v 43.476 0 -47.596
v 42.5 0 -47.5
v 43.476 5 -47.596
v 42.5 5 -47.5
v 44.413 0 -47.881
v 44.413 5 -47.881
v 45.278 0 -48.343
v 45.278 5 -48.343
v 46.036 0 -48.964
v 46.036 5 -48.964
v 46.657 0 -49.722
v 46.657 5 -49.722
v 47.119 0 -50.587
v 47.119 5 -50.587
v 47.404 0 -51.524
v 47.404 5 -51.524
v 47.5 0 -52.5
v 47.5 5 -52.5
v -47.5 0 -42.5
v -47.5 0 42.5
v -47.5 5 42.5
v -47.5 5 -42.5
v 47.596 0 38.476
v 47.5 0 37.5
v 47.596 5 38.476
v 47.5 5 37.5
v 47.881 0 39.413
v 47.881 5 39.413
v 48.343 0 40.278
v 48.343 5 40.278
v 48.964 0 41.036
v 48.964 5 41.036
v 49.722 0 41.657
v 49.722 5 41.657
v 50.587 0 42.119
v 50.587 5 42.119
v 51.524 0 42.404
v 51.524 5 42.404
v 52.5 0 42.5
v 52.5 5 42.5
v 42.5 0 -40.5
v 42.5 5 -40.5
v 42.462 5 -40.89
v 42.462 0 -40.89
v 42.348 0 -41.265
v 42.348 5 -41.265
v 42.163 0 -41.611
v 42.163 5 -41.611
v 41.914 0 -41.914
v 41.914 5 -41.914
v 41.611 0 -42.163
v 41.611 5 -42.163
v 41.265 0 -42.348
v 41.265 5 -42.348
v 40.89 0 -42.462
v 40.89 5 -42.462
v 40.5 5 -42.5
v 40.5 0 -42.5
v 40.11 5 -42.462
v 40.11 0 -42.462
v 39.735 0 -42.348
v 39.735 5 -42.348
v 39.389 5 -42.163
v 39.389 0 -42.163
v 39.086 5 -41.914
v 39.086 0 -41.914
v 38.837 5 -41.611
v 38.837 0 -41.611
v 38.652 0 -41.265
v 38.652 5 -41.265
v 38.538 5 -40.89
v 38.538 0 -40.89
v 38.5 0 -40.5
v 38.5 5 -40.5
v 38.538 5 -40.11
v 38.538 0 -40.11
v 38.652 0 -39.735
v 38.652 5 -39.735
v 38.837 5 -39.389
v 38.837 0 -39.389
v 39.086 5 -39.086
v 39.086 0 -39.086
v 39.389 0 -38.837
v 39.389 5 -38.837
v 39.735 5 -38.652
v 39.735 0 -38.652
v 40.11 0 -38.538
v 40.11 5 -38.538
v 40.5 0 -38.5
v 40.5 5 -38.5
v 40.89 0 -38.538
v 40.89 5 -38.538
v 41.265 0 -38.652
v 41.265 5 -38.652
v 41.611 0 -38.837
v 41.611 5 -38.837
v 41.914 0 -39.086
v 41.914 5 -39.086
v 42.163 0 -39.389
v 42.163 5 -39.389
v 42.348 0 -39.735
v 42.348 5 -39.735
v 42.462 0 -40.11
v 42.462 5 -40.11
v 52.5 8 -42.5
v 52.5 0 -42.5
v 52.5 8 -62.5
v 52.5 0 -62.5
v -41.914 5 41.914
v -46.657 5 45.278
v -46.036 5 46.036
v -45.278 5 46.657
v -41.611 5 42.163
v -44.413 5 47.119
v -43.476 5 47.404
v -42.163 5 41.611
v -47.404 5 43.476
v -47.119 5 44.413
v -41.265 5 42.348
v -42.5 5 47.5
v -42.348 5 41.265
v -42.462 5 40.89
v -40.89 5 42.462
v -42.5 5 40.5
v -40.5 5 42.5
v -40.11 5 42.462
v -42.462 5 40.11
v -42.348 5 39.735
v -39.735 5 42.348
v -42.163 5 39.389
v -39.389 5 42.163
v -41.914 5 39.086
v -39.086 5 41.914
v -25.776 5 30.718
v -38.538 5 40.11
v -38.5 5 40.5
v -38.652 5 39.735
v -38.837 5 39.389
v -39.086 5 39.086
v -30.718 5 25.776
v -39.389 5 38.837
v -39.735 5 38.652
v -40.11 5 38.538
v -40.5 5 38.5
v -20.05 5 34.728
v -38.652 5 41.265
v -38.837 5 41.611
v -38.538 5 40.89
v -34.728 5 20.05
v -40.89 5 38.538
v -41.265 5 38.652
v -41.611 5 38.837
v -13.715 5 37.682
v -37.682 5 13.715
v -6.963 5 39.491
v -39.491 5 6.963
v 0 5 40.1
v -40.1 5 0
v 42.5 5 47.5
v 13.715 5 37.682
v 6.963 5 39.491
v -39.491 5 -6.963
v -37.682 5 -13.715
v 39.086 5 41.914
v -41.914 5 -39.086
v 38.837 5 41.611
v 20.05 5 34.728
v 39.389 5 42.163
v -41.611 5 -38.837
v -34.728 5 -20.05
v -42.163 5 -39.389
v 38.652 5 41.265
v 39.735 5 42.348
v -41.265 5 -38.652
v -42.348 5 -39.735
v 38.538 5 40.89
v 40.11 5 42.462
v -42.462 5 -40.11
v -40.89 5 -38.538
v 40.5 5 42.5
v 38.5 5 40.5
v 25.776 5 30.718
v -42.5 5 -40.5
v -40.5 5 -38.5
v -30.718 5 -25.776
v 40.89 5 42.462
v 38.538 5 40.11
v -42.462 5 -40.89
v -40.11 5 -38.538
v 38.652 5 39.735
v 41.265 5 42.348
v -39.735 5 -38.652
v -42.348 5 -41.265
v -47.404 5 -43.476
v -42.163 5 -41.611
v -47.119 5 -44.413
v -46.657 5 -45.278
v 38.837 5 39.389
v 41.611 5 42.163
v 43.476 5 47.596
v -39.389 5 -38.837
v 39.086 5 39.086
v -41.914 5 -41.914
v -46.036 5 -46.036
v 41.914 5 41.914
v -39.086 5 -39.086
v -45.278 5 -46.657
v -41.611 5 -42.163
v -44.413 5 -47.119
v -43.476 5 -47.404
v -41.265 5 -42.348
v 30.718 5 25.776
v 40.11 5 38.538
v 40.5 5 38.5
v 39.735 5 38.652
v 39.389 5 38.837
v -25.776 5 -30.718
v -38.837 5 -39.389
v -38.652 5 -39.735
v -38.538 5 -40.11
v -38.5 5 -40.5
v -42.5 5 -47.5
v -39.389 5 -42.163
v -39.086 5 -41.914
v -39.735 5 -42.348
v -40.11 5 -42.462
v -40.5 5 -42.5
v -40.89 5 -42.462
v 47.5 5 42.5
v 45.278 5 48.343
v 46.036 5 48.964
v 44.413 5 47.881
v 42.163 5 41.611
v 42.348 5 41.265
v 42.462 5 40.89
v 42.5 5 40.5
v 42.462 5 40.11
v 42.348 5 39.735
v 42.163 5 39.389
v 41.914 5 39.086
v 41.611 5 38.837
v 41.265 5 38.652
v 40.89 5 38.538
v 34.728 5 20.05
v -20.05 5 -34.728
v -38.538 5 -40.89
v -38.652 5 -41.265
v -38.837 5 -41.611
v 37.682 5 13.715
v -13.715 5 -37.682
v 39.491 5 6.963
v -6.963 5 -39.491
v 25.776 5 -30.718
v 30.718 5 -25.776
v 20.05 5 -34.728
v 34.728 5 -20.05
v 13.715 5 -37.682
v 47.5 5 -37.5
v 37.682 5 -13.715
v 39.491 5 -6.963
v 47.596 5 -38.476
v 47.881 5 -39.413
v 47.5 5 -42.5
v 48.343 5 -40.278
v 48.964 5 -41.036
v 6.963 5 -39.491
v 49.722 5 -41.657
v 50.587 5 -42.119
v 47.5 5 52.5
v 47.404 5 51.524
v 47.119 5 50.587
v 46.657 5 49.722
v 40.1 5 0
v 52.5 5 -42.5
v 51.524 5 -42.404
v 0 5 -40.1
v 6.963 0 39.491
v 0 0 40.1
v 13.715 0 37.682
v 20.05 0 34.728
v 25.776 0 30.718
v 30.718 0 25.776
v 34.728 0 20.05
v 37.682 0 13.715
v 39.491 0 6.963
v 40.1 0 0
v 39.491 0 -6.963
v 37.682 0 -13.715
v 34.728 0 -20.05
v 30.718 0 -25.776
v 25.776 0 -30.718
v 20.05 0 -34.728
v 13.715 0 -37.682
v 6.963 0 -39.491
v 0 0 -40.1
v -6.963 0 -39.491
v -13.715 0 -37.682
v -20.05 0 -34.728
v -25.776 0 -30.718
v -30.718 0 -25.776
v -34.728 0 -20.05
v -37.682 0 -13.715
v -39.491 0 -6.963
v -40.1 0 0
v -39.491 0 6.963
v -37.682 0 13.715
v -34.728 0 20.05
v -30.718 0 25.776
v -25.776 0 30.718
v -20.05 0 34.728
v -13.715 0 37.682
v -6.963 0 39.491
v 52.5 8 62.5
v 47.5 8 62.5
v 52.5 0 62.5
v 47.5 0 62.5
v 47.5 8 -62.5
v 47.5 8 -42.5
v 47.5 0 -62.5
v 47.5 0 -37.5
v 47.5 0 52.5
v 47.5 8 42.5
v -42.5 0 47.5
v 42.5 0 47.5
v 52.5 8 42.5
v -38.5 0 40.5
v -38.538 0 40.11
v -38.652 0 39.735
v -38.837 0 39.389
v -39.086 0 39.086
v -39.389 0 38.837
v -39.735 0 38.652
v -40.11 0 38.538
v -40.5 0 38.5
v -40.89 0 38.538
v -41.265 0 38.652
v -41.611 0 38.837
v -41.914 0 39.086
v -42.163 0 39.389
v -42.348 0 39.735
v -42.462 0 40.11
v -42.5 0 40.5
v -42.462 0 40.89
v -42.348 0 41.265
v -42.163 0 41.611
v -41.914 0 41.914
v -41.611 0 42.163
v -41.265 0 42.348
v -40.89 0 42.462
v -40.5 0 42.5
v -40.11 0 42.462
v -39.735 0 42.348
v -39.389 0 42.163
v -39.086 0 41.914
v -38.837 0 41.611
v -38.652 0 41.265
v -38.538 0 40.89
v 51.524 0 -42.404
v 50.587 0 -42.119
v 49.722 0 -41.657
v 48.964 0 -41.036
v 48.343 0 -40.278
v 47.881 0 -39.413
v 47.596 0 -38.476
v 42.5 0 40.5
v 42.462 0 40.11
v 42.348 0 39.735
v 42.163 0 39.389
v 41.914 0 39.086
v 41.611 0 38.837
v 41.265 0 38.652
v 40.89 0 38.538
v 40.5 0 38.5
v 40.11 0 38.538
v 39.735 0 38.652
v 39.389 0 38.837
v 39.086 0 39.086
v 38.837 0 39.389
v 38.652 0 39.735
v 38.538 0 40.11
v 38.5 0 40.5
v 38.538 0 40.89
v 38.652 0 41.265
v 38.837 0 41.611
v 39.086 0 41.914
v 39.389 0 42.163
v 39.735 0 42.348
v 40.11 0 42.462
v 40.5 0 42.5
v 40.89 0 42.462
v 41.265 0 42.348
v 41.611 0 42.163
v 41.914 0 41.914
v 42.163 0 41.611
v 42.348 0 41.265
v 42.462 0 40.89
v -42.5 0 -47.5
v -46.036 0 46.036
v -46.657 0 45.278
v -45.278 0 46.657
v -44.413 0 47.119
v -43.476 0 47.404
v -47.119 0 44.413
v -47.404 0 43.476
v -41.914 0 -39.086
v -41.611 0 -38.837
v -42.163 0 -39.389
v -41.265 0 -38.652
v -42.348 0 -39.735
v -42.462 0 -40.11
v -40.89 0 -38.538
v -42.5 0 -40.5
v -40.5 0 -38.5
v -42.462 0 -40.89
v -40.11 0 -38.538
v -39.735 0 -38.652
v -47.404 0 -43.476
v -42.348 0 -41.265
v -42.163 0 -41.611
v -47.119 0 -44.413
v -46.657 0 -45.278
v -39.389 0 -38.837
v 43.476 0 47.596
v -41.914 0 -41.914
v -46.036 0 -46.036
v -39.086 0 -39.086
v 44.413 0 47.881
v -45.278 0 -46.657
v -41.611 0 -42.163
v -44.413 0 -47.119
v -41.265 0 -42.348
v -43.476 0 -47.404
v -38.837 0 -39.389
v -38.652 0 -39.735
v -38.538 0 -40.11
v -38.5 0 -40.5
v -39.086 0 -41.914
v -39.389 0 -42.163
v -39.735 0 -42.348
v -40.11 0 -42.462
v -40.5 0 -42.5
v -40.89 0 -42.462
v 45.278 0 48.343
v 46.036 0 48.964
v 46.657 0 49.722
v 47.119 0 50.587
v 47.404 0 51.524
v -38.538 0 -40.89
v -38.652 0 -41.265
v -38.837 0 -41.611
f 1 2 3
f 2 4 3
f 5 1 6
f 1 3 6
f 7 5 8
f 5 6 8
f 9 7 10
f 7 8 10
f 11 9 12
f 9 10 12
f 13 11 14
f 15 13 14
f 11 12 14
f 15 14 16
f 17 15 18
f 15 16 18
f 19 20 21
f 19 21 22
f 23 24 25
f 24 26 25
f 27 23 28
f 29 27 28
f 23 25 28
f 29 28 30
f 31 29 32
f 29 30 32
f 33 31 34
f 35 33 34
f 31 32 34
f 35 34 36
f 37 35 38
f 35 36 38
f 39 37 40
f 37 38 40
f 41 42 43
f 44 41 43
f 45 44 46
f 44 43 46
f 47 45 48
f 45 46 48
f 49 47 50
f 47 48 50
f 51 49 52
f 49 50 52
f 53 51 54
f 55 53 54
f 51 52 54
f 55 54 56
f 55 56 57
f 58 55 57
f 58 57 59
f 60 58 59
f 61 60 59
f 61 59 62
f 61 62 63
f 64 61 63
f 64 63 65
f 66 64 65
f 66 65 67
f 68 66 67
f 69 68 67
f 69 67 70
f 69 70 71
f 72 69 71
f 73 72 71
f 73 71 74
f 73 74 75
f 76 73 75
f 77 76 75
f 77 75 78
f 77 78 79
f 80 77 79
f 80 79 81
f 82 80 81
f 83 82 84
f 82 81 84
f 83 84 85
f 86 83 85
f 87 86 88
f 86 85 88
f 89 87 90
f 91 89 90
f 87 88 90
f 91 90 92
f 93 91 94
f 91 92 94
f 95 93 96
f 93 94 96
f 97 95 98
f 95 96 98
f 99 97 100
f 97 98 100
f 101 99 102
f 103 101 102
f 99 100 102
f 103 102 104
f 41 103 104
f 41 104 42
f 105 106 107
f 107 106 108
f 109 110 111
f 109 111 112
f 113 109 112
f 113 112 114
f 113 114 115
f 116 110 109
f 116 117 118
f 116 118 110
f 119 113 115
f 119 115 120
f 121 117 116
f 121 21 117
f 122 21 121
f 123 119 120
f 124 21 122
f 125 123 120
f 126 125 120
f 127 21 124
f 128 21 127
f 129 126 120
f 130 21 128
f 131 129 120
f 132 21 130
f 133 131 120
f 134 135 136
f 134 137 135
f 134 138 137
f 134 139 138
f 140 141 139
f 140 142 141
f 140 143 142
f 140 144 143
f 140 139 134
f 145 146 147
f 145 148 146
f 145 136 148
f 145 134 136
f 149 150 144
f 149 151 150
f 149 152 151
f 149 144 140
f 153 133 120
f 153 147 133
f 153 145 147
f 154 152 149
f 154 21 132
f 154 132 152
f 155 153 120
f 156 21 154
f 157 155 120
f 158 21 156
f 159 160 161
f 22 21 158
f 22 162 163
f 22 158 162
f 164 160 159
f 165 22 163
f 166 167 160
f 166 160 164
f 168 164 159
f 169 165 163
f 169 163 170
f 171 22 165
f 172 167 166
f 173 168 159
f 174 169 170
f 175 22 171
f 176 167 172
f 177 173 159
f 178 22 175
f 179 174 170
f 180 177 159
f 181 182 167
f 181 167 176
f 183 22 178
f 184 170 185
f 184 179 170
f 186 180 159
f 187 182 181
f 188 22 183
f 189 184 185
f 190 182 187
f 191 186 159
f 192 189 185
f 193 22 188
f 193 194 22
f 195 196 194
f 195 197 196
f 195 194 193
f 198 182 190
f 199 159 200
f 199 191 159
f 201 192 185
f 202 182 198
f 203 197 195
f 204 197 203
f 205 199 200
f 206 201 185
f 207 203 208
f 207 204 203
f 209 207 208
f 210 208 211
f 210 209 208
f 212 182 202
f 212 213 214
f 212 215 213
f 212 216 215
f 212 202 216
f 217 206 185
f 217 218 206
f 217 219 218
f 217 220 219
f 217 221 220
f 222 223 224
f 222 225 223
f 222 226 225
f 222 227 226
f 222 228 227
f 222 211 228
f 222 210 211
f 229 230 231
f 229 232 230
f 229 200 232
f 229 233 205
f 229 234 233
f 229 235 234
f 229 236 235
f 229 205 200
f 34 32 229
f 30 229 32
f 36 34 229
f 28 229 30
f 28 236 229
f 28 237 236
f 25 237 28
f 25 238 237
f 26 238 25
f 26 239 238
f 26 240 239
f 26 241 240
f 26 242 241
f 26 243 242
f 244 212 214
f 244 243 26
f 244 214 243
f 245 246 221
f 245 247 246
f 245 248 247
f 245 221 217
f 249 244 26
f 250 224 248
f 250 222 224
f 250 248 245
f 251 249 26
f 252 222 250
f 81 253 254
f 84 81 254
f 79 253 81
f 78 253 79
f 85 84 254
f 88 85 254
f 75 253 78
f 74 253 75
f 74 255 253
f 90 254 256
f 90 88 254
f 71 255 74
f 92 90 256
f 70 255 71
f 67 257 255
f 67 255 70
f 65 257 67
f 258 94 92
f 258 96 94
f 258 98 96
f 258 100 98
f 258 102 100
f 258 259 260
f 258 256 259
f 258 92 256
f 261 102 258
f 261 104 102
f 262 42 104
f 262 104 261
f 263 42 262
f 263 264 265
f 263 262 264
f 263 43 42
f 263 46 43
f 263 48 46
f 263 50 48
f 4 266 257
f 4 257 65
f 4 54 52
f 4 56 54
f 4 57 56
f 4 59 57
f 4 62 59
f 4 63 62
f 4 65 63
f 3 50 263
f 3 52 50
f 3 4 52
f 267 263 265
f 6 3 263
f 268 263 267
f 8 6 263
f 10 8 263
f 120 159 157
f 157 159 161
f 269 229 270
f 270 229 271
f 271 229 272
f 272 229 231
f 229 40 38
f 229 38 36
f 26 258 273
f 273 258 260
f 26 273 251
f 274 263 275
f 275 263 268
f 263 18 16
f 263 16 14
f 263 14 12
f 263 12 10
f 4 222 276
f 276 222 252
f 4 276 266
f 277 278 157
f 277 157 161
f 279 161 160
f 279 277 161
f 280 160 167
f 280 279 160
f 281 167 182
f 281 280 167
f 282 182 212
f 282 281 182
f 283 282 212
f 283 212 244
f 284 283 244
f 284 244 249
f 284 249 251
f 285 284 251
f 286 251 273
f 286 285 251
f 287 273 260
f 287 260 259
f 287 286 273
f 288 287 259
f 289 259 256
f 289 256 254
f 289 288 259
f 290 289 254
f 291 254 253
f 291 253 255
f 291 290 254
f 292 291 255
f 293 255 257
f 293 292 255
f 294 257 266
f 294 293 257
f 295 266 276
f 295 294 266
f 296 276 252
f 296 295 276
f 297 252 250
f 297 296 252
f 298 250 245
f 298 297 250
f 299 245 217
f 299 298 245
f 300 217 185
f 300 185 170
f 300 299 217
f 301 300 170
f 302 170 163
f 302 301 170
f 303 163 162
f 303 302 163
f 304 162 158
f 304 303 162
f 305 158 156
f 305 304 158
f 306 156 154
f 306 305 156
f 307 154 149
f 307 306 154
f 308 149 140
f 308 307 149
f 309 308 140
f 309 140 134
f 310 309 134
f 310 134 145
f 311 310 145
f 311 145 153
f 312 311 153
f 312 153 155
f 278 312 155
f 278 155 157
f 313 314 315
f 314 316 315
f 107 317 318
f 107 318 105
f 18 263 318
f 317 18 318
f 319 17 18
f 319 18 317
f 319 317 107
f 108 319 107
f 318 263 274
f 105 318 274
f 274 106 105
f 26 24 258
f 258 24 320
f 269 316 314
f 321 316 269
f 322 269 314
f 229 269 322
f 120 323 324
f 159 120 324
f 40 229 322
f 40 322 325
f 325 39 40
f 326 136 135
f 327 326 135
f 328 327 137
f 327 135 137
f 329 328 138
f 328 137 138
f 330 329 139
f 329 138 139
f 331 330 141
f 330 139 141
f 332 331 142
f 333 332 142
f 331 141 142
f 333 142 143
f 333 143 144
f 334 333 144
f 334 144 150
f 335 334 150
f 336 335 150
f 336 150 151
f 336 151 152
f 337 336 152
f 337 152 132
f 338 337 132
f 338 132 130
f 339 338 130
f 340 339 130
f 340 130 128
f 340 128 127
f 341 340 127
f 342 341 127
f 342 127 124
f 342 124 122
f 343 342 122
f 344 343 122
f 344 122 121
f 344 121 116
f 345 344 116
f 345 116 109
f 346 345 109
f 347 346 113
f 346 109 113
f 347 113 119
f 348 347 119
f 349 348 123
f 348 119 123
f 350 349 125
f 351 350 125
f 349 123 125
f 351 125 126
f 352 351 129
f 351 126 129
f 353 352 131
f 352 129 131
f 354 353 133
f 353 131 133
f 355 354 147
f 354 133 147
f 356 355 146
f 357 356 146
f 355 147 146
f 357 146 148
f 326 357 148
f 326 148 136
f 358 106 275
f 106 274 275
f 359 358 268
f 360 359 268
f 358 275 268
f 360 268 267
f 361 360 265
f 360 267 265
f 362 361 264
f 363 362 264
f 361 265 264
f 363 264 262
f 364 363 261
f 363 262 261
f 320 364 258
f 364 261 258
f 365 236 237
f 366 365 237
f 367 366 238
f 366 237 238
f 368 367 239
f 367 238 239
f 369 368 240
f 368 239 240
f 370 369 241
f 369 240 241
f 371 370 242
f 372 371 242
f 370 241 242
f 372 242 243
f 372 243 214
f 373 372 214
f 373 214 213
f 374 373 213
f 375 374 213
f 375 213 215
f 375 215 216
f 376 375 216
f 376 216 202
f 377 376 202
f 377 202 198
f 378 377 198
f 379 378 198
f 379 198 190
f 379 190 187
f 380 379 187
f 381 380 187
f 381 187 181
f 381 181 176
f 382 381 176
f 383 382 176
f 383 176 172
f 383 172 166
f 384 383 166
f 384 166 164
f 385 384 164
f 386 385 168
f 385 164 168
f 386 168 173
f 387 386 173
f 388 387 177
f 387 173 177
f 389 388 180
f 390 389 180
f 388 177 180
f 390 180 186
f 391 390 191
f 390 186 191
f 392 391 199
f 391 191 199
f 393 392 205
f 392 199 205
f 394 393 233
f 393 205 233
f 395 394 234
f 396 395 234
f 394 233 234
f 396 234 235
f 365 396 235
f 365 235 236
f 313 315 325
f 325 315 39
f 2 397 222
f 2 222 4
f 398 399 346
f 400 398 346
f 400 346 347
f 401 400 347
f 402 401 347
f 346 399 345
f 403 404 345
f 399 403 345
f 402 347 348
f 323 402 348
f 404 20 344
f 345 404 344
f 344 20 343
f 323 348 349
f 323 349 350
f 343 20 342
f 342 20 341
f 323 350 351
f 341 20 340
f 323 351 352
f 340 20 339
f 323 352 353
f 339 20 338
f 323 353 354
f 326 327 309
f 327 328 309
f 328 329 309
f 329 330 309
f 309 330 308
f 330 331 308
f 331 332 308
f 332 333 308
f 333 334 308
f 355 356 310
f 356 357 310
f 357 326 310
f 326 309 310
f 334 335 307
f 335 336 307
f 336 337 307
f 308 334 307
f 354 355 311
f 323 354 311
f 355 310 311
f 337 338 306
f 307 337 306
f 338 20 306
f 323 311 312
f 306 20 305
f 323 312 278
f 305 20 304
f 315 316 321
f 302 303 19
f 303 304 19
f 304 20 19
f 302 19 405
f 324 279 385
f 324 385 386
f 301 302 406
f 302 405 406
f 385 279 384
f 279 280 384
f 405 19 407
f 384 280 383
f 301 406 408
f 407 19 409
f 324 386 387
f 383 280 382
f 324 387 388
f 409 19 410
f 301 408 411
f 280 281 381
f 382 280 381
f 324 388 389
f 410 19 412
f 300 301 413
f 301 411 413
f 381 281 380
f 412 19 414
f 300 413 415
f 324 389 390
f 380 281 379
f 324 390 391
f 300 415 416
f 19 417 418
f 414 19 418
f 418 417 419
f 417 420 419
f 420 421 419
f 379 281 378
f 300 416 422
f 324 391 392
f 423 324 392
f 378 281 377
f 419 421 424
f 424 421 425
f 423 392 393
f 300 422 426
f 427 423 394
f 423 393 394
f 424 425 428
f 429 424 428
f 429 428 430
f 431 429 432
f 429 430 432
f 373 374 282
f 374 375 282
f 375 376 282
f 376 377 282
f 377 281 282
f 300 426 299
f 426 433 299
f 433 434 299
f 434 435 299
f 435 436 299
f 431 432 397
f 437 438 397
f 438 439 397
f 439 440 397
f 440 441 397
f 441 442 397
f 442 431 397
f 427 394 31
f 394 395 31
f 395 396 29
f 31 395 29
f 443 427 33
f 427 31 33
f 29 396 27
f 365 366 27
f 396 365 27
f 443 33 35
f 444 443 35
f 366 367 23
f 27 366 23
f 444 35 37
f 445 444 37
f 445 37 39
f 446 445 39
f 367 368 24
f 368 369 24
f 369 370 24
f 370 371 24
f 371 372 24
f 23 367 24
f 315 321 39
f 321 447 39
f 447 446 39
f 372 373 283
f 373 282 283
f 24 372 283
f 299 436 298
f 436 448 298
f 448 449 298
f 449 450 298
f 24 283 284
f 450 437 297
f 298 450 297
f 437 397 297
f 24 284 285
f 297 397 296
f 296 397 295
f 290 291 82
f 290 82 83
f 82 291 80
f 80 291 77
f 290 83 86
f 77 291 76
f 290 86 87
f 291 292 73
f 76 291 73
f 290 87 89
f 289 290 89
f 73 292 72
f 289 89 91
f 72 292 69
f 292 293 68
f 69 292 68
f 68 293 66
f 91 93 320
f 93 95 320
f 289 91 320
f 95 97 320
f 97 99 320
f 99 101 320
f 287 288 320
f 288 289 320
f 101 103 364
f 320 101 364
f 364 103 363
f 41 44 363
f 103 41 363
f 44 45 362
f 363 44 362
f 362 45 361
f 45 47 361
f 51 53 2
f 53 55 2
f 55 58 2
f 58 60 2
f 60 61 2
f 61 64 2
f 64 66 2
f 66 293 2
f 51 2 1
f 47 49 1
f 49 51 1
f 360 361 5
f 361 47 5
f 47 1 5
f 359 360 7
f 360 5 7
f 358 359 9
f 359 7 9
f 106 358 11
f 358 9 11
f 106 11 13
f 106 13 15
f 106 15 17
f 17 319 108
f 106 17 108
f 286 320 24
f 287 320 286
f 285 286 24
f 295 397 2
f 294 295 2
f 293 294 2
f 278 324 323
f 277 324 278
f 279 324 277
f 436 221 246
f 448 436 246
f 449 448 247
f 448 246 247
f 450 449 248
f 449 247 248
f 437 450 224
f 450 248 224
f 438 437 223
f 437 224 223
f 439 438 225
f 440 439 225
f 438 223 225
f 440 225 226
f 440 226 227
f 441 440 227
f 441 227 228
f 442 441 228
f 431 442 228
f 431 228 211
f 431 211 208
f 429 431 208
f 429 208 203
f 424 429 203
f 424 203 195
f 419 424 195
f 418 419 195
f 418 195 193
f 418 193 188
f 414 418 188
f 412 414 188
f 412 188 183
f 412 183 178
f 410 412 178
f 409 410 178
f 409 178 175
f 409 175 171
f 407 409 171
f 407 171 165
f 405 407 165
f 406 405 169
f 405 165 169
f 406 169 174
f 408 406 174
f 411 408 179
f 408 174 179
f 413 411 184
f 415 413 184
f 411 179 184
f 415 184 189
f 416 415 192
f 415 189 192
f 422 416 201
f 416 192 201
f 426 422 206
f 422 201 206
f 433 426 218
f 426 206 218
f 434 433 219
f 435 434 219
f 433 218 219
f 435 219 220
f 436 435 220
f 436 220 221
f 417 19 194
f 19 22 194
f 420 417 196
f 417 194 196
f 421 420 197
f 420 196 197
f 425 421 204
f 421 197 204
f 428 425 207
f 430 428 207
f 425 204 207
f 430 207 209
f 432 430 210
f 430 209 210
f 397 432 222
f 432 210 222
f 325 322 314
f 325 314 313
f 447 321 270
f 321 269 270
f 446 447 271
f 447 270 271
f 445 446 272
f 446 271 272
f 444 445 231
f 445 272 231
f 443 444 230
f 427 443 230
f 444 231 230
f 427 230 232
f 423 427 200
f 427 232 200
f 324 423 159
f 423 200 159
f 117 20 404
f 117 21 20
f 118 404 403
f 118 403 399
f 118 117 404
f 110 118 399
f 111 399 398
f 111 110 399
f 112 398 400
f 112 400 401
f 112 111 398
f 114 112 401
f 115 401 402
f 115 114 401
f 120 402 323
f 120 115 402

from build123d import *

# Parameters (mm, degrees)
SKETCH1_W             = 95
SKETCH1_H             = 95
SKETCH1_W_2           = 81
SKETCH1_H_2           = 81
SKETCH1_R             = 40.1
BOSS_EXTRUDE1_DEPTH   = 5
F_4_0MM_DOWEL_HOLE1_D = 4
SKETCH5_W             = 5
SKETCH5_H             = 20
BOSS_EXTRUDE2_DEPTH   = 5
SKETCH6_W             = 5
SKETCH6_H             = 20
BOSS_EXTRUDE3_DEPTH   = 3
FILLET1_R             = 5


with BuildPart() as part:
    # Sketch1 → Boss-Extrude1 (new body)
    # profile 1 of 2: a face of its own
    with BuildSketch(Plane(origin=(0, 0, 0), x_dir=(1, 0, 0), z_dir=(0, 1, 0))):
        Rectangle(SKETCH1_W, SKETCH1_H)
        Rectangle(SKETCH1_W_2, SKETCH1_H_2, mode=Mode.SUBTRACT)
    # profile 2 of 2: a face of its own
    with BuildSketch(Plane(origin=(0, 0, 0), x_dir=(1, 0, 0), z_dir=(0, 1, 0))):
        Rectangle(SKETCH1_W_2, SKETCH1_H_2)
        with Locations(Location((0, 0, 0), (0, 0, 270))):
            Circle(SKETCH1_R, mode=Mode.SUBTRACT)
    extrude(amount=BOSS_EXTRUDE1_DEPTH)

    # Ø4.0mm Dowel Hole1 (through all)
    with Locations(Plane(origin=(0, 0, 0), x_dir=(-1, 0, 0), z_dir=(0, -1, 0))):
        with Locations((40.5, -40.5), (-40.5, -40.5), (-40.5, 40.5), (40.5, 40.5)):
            Hole(F_4_0MM_DOWEL_HOLE1_D / 2)

    # Sketch5 → Boss-Extrude2 (add)
    with BuildSketch(Plane(origin=(0, 0, 0), x_dir=(1, 0, 0), z_dir=(0, 1, 0))):
        with Locations((50, -52.5)):
            Rectangle(SKETCH5_W, SKETCH5_H)
        with Locations((50, 52.5)):
            Rectangle(SKETCH5_W, SKETCH5_H)
    extrude(amount=BOSS_EXTRUDE2_DEPTH)

    # Sketch6 → Boss-Extrude3 (add)
    with BuildSketch(Plane(origin=(0, 5, 0), x_dir=(1, 0, 0), z_dir=(0, 1, 0))):
        with Locations((50, -52.5)):
            Rectangle(SKETCH6_W, SKETCH6_H)
        with Locations((50, 52.5)):
            Rectangle(SKETCH6_W, SKETCH6_H)
    extrude(amount=BOSS_EXTRUDE3_DEPTH)

    # Fillet1
    fillet1_edges = [part.edges().sort_by_distance(p)[0] for p in [
        (-47.5, 2.5, -47.5),
        (-47.5, 2.5, 47.5),
        (47.5, 2.5, 47.5),
        (47.5, 2.5, 42.5),
        (47.5, 2.5, -42.5),
        (47.5, 2.5, -47.5),
    ]]
    fillet(fillet1_edges, radius=FILLET1_R - 0.0001)  # a hair under: the kernel refuses the full size


solid = part.part
